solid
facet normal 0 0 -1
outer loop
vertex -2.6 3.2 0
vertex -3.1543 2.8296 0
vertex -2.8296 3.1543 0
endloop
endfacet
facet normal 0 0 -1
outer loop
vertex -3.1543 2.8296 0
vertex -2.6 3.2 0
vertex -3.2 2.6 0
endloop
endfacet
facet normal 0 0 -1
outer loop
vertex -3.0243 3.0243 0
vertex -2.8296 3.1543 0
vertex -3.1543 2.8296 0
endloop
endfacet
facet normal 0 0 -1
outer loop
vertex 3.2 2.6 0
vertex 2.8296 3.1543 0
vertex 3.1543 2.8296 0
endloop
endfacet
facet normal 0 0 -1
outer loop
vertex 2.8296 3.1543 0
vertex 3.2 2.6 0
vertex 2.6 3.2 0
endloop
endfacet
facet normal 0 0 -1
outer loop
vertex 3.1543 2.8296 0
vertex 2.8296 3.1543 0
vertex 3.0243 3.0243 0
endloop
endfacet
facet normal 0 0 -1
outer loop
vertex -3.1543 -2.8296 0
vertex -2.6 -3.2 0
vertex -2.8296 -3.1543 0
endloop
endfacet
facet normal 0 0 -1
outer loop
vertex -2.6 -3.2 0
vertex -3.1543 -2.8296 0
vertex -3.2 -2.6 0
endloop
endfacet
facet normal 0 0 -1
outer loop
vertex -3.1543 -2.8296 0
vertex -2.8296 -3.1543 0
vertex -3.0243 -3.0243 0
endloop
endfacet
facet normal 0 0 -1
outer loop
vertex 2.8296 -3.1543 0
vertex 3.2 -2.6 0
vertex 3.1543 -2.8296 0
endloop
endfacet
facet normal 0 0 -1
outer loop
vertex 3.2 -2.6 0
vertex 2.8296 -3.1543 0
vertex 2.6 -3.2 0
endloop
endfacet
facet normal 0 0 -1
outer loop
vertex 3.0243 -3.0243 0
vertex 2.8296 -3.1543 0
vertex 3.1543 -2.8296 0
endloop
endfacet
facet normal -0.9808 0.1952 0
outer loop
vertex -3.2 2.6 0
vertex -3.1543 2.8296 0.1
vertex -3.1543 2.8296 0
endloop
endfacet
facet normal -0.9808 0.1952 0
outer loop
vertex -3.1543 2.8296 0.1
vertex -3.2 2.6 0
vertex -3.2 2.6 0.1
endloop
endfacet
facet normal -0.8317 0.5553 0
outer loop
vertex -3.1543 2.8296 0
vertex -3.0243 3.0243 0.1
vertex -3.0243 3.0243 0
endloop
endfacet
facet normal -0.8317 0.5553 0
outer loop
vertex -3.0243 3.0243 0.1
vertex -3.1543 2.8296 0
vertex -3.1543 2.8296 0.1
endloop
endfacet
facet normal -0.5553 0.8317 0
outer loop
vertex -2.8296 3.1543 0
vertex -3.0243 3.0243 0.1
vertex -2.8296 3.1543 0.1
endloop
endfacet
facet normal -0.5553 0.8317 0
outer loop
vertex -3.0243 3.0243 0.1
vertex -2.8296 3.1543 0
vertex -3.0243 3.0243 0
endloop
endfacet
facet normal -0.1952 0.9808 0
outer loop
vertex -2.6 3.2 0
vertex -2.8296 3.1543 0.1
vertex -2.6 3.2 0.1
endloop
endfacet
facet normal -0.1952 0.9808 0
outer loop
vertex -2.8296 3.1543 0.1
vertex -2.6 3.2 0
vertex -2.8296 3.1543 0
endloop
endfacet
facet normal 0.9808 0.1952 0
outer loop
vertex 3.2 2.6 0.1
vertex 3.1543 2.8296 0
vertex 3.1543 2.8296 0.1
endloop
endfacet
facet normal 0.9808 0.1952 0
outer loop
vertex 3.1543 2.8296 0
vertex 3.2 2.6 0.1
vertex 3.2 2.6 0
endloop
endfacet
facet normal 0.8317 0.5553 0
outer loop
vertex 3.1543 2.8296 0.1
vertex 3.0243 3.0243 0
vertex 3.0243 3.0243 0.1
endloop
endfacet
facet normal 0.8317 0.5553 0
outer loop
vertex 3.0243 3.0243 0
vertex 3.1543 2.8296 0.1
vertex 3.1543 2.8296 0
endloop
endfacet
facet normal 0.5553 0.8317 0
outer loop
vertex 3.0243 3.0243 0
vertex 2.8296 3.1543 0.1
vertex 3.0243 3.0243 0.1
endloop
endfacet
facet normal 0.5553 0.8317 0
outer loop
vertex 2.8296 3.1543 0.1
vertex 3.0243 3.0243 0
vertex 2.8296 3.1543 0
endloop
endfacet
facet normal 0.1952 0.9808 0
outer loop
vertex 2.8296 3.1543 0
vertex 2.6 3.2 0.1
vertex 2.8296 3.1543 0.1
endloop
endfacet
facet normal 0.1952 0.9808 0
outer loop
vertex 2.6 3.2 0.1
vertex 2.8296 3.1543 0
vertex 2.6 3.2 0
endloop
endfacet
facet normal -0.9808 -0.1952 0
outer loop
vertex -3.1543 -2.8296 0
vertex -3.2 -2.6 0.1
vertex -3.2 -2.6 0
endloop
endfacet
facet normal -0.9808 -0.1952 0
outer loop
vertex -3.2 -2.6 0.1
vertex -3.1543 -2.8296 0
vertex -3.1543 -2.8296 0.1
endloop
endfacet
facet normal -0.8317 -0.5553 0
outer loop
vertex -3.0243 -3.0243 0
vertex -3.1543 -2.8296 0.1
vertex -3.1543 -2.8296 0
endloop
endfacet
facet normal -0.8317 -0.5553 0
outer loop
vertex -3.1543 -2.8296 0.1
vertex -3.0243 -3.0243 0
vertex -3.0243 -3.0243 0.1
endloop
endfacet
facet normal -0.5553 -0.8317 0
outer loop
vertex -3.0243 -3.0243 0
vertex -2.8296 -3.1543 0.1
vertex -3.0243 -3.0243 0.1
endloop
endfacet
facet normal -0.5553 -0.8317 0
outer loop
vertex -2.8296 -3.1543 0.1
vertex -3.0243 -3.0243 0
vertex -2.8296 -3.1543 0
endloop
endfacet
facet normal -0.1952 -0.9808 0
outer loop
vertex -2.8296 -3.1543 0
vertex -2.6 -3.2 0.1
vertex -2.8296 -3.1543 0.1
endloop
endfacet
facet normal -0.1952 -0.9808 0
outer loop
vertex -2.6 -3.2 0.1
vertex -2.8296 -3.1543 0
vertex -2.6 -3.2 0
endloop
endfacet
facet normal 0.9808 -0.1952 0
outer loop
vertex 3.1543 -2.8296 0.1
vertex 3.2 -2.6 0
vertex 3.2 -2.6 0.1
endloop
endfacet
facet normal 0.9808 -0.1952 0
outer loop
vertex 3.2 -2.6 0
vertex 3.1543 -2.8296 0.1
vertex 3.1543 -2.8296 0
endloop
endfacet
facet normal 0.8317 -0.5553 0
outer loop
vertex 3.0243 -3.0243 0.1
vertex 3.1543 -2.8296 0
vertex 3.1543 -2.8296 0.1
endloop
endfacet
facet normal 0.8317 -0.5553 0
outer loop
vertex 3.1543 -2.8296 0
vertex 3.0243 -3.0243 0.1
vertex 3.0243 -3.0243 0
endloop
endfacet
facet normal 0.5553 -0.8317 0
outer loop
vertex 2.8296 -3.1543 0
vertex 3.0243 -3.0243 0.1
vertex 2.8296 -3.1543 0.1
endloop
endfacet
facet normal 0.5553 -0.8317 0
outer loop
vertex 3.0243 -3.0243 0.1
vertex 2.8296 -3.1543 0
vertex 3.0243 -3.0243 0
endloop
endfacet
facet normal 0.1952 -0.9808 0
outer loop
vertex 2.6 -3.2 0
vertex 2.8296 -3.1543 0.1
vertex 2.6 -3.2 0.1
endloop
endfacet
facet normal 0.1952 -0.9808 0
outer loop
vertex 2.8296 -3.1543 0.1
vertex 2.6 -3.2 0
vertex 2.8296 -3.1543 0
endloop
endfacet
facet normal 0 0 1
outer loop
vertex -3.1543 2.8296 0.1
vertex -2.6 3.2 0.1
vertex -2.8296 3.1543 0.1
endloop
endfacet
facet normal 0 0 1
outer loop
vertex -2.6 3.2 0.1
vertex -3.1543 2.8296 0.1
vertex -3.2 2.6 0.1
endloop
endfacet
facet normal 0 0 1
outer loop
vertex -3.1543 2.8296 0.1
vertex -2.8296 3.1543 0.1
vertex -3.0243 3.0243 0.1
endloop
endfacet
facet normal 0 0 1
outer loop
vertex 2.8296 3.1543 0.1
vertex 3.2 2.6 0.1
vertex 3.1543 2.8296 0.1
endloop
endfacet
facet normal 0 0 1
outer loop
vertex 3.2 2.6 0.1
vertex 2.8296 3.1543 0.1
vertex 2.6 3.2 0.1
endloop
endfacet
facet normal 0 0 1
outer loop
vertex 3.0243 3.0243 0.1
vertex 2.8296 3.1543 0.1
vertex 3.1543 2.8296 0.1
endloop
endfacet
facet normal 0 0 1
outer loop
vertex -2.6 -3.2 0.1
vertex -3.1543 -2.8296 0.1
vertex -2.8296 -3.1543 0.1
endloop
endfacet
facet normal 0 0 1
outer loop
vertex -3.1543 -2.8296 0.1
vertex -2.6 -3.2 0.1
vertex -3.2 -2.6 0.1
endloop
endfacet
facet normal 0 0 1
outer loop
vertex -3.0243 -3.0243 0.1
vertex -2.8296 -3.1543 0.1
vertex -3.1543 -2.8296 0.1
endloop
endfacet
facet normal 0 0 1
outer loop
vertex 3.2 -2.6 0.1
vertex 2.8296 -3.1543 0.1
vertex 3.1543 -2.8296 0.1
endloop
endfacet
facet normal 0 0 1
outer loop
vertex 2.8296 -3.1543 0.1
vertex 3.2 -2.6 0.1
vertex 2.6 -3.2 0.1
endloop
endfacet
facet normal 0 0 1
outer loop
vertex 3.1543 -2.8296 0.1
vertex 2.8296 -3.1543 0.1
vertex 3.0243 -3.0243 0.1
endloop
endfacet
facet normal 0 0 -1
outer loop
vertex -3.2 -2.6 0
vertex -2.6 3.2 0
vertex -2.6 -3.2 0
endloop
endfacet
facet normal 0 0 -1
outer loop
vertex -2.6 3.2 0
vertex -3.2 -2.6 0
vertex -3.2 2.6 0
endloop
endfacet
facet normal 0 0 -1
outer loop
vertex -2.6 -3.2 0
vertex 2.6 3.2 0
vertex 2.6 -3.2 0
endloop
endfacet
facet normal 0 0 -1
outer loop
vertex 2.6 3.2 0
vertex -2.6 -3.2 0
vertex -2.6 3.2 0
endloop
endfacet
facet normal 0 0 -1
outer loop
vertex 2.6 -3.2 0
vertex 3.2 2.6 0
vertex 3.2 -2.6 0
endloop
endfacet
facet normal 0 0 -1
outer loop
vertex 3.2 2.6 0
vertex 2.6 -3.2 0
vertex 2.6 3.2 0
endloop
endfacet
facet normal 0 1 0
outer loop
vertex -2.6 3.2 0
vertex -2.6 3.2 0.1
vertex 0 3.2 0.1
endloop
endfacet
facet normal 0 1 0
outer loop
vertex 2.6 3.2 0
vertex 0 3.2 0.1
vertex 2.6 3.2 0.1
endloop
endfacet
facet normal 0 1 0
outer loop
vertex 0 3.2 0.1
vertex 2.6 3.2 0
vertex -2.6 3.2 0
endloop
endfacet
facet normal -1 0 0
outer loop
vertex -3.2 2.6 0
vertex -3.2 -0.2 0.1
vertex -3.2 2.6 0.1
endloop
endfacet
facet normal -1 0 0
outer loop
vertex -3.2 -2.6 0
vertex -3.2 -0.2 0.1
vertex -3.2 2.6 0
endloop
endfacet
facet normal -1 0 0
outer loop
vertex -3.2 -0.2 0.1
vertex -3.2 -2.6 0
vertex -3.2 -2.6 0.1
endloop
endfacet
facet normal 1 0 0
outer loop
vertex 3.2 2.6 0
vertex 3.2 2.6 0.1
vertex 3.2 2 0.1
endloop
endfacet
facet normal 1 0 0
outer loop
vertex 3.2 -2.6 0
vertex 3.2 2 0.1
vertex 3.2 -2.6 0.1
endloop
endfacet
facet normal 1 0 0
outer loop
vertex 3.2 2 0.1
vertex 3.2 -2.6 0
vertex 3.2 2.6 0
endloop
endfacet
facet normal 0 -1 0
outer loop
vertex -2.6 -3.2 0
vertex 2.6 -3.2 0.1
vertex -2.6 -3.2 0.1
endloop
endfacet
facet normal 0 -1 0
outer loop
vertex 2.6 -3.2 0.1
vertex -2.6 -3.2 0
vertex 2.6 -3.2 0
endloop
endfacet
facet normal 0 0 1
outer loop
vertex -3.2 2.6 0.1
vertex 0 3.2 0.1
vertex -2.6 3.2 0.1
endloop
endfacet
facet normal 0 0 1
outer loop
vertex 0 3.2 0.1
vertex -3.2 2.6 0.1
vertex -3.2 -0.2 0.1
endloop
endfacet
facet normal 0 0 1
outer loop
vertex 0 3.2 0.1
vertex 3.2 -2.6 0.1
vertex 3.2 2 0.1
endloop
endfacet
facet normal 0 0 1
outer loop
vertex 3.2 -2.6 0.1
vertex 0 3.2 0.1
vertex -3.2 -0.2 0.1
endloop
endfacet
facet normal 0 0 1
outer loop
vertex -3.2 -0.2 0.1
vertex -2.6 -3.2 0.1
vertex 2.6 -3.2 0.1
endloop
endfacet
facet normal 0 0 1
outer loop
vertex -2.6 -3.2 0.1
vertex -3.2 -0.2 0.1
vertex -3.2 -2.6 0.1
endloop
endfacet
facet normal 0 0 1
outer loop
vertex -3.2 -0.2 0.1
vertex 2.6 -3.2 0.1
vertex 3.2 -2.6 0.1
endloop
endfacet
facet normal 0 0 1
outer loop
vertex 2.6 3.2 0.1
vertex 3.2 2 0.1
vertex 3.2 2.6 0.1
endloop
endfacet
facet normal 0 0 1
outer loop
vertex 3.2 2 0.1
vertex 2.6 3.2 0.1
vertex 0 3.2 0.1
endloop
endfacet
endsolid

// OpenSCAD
// file: ../p/1-4cyli.scad
use <../lib.scad>
function ldraw_lib__1_4cyli() = [
// 0 Cylinder 0.25
// 0 Name: 1-4cyli.dat
// 0 Author: James Jessiman
// 0 !LDRAW_ORG Primitive UPDATE 2012-01
// 0 !LICENSE Licensed under CC BY 4.0 : see CAreadme.txt
// 
// 0 BFC CERTIFY CCW
  [0,"BFC","CERTIFY"],
  [0,"BFC","CCW"],
// 
// 0 !HISTORY 2002-03-23 [sbliss] Added BFC statement.
// 0 !HISTORY 2002-04-25 [PTadmin] Official Update 2002-02
// 0 !HISTORY 2007-06-22 [PTadmin] Header formatted for Contributor Agreement
// 0 !HISTORY 2008-07-01 [PTadmin] Official Update 2008-01
// 0 !HISTORY 2012-02-16 [Philo] Changed to CCW
// 0 !HISTORY 2012-03-30 [PTadmin] Official Update 2012-01
// 
// 
// 4 16 1 1 0 0.9239 1 0.3827 0.9239 0 0.3827 1 0 0
  [4,16,1,1,0,0.9239,1,0.3827,0.9239,0,0.3827,1,0,0],
// 5 24 1 0 0 1 1 0 0.9239 0 0.3827 1 0 -1
  [5,24,1,0,0,1,1,0,0.9239,0,0.3827,1,0,-1],
// 4 16 0.9239 1 0.3827 0.7071 1 0.7071 0.7071 0 0.7071 0.9239 0 0.3827
  [4,16,0.9239,1,0.3827,0.7071,1,0.7071,0.7071,0,0.7071,0.9239,0,0.3827],
// 5 24 0.9239 0 0.3827 0.9239 1 0.3827 0.7071 0 0.7071 1 0 0
  [5,24,0.9239,0,0.3827,0.9239,1,0.3827,0.7071,0,0.7071,1,0,0],
// 4 16 0.7071 1 0.7071 0.3827 1 0.9239 0.3827 0 0.9239 0.7071 0 0.7071
  [4,16,0.7071,1,0.7071,0.3827,1,0.9239,0.3827,0,0.9239,0.7071,0,0.7071],
// 5 24 0.7071 0 0.7071 0.7071 1 0.7071 0.3827 0 0.9239 0.9239 0 0.3827
  [5,24,0.7071,0,0.7071,0.7071,1,0.7071,0.3827,0,0.9239,0.9239,0,0.3827],
// 4 16 0.3827 1 0.9239 0 1 1 0 0 1 0.3827 0 0.9239
  [4,16,0.3827,1,0.9239,0,1,1,0,0,1,0.3827,0,0.9239],
// 5 24 0.3827 0 0.9239 0.3827 1 0.9239 0 0 1 0.7071 0 0.7071
  [5,24,0.3827,0,0.9239,0.3827,1,0.9239,0,0,1,0.7071,0,0.7071],
// 5 24 0 0 1 0 1 1 0.3827 0 0.9239 -1 0 1
  [5,24,0,0,1,0,1,1,0.3827,0,0.9239,-1,0,1],
];
module ldraw_lib__1_4cyli(step=0, col=false, unit=2/5, alt=false, line=0.2, solid=!$preview)
    makepoly(ldraw_lib__1_4cyli(), step=step, col=col, unit=unit, alt=alt, line=line, solid=solid);
ldraw_lib__1_4cyli(line=0.2);
// file: ../p/1-4chrd.scad
use <../lib.scad>
function ldraw_lib__1_4chrd() = [
// 0 Chord 0.25
// 0 Name: 1-4chrd.dat
// 0 Author: Max Martin Richter [MMR1988]
// 0 !LDRAW_ORG Primitive UPDATE 2023-05
// 0 !LICENSE Licensed under CC BY 4.0 : see CAreadme.txt
// 
// 0 BFC CERTIFY CCW
  [0,"BFC","CERTIFY"],
  [0,"BFC","CCW"],
// 
// 0 !HISTORY 2004-04-22 [PTadmin] Official Update 2004-02
// 0 !HISTORY 2007-10-09 [PTadmin] Header formatted for Contributor Agreement
// 0 !HISTORY 2008-07-01 [PTadmin] Official Update 2008-01
// 0 !HISTORY 2012-08-02 [MMR1988] Re-creation with PrimGen2 and Rectifier
// 0 !HISTORY 2012-08-09 [PTadmin] Official Update 2012-02
// 0 !HISTORY 2023-10-27 [OrionP] Change author to MMR1988 from hafhead
// 0 !HISTORY 2023-10-31 [OrionP] Official Update 2023-05
// 
// 4 16 0.9239 0 0.3827 0.3827 0 0.9239 0 0 1 1 0 0
  [4,16,0.9239,0,0.3827,0.3827,0,0.9239,0,0,1,1,0,0],
// 3 16 0.7071 0 0.7071 0.3827 0 0.9239 0.9239 0 0.3827
  [3,16,0.7071,0,0.7071,0.3827,0,0.9239,0.9239,0,0.3827],
];
module ldraw_lib__1_4chrd(step=0, col=false, unit=2/5, alt=false, line=0.2, solid=!$preview)
    makepoly(ldraw_lib__1_4chrd(), step=step, col=col, unit=unit, alt=alt, line=line, solid=solid);
ldraw_lib__1_4chrd(line=0.2);
// main file
use <../lib.scad>
use <../p/1-4chrd.scad>
use <../p/1-4cyli.scad>
function ldraw_lib__6221655s() = [
// 0 Sticker  0.8 x  0.8 with Grey and Red Stripes on White Background Right
// 0 Name: 6221655s.dat
// 0 Author: Massimo Maso [Sirio]
// 0 !LDRAW_ORG Part UPDATE 2024-09
// 0 !LICENSE Licensed under CC BY 4.0 : see CAreadme.txt
// 
// 0 BFC CERTIFY CCW
  [0,"BFC","CERTIFY"],
  [0,"BFC","CCW"],
// 
// 0 !KEYWORDS 3.0, 911 RSR, Porsche, Set 75888, Speed Champions
// 
// 0 !HISTORY 2024-10-27 [OrionP] Official Update 2024-09
// 
// 0 // Primitives
// 1 16 -6.5 0 6.5 -1.5 0 0 0 -1 0 0 0 1.5 1-4chrd.dat
  [1,16,-6.5,0,6.5,-1.5,0,0,0,-1,0,0,0,1.5, ldraw_lib__1_4chrd()],
// 1 16 6.5 0 6.5 1.5 0 0 0 -1 0 0 0 1.5 1-4chrd.dat
  [1,16,6.5,0,6.5,1.5,0,0,0,-1,0,0,0,1.5, ldraw_lib__1_4chrd()],
// 1 16 -6.5 0 -6.5 -1.5 0 0 0 -1 0 0 0 -1.5 1-4chrd.dat
  [1,16,-6.5,0,-6.5,-1.5,0,0,0,-1,0,0,0,-1.5, ldraw_lib__1_4chrd()],
// 1 16 6.5 0 -6.5 1.5 0 0 0 -1 0 0 0 -1.5 1-4chrd.dat
  [1,16,6.5,0,-6.5,1.5,0,0,0,-1,0,0,0,-1.5, ldraw_lib__1_4chrd()],
// 1 16 -6.5 -.25 6.5 -1.5 0 0 0 .25 0 0 0 1.5 1-4cyli.dat
  [1,16,-6.5,-.25,6.5,-1.5,0,0,0,.25,0,0,0,1.5, ldraw_lib__1_4cyli()],
// 1 16 6.5 -.25 6.5 1.5 0 0 0 .25 0 0 0 1.5 1-4cyli.dat
  [1,16,6.5,-.25,6.5,1.5,0,0,0,.25,0,0,0,1.5, ldraw_lib__1_4cyli()],
// 1 16 -6.5 -.25 -6.5 -1.5 0 0 0 .25 0 0 0 -1.5 1-4cyli.dat
  [1,16,-6.5,-.25,-6.5,-1.5,0,0,0,.25,0,0,0,-1.5, ldraw_lib__1_4cyli()],
// 1 16 6.5 -.25 -6.5 1.5 0 0 0 .25 0 0 0 -1.5 1-4cyli.dat
  [1,16,6.5,-.25,-6.5,1.5,0,0,0,.25,0,0,0,-1.5, ldraw_lib__1_4cyli()],
// 1 71 -6.5 -.25 6.5 -1.5 0 0 0 1 0 0 0 1.5 1-4chrd.dat
  [1,71,-6.5,-.25,6.5,-1.5,0,0,0,1,0,0,0,1.5, ldraw_lib__1_4chrd()],
// 1 15 6.5 -.25 6.5 1.5 0 0 0 1 0 0 0 1.5 1-4chrd.dat
  [1,15,6.5,-.25,6.5,1.5,0,0,0,1,0,0,0,1.5, ldraw_lib__1_4chrd()],
// 1 4 -6.5 -.25 -6.5 -1.5 0 0 0 1 0 0 0 -1.5 1-4chrd.dat
  [1,4,-6.5,-.25,-6.5,-1.5,0,0,0,1,0,0,0,-1.5, ldraw_lib__1_4chrd()],
// 1 4 6.5 -.25 -6.5 1.5 0 0 0 1 0 0 0 -1.5 1-4chrd.dat
  [1,4,6.5,-.25,-6.5,1.5,0,0,0,1,0,0,0,-1.5, ldraw_lib__1_4chrd()],
// 0 // Bottom face
// 4 16 -6.5 0 8 -6.5 0 -8 -8 0 -6.5 -8 0 6.5
  [4,16,-6.5,0,8,-6.5,0,-8,-8,0,-6.5,-8,0,6.5],
// 4 16 -6.5 0 8 6.5 0 8 6.5 0 -8 -6.5 0 -8
  [4,16,-6.5,0,8,6.5,0,8,6.5,0,-8,-6.5,0,-8],
// 4 16 6.5 0 8 8 0 6.5 8 0 -6.5 6.5 0 -8
  [4,16,6.5,0,8,8,0,6.5,8,0,-6.5,6.5,0,-8],
// 0 // Lateral face
// 3 16 -6.5 0 8 -6.5 -.25 8 0 -.25 8
  [3,16,-6.5,0,8,-6.5,-.25,8,0,-.25,8],
// 4 16 -6.5 0 8 0 -.25 8 6.5 -.25 8 6.5 0 8
  [4,16,-6.5,0,8,0,-.25,8,6.5,-.25,8,6.5,0,8],
// 3 16 -8 0 6.5 -8 -.25 -.5 -8 -.25 6.5
  [3,16,-8,0,6.5,-8,-.25,-.5,-8,-.25,6.5],
// 4 16 -8 0 6.5 -8 0 -6.5 -8 -.25 -6.5 -8 -.25 -.5
  [4,16,-8,0,6.5,-8,0,-6.5,-8,-.25,-6.5,-8,-.25,-.5],
// 3 16 8 0 6.5 8 -.25 6.5 8 -.25 5
  [3,16,8,0,6.5,8,-.25,6.5,8,-.25,5],
// 4 16 8 0 6.5 8 -.25 5 8 -.25 -6.5 8 0 -6.5
  [4,16,8,0,6.5,8,-.25,5,8,-.25,-6.5,8,0,-6.5],
// 4 16 -6.5 0 -8 6.5 0 -8 6.5 -.25 -8 -6.5 -.25 -8
  [4,16,-6.5,0,-8,6.5,0,-8,6.5,-.25,-8,-6.5,-.25,-8],
// 0 // Top face
// 0 // Grey faces
// 4 71 -8 -.25 -.5 0 -.25 8 -6.5 -.25 8 -8 -.25 6.5
  [4,71,-8,-.25,-.5,0,-.25,8,-6.5,-.25,8,-8,-.25,6.5],
// 4 71 -8 -.25 -.5 8 -.25 -6.5 8 -.25 5 0 -.25 8
  [4,71,-8,-.25,-.5,8,-.25,-6.5,8,-.25,5,0,-.25,8],
// 0 // Red faces
// 4 4 -8 -.25 -.5 -8 -.25 -6.5 -6.5 -.25 -8 6.5 -.25 -8
  [4,4,-8,-.25,-.5,-8,-.25,-6.5,-6.5,-.25,-8,6.5,-.25,-8],
// 3 4 -8 -.25 -.5 6.5 -.25 -8 8 -.25 -6.5
  [3,4,-8,-.25,-.5,6.5,-.25,-8,8,-.25,-6.5],
// 0 // White face
// 4 15 0 -.25 8 8 -.25 5 8 -.25 6.5 6.5 -.25 8
  [4,15,0,-.25,8,8,-.25,5,8,-.25,6.5,6.5,-.25,8],
];
module ldraw_lib__6221655s(step=0, col=false, unit=2/5, alt=false, line=0.2, solid=!$preview)
    makepoly(ldraw_lib__6221655s(), step=step, col=col, unit=unit, alt=alt, line=line, solid=solid);
ldraw_lib__6221655s(line=0.2);
